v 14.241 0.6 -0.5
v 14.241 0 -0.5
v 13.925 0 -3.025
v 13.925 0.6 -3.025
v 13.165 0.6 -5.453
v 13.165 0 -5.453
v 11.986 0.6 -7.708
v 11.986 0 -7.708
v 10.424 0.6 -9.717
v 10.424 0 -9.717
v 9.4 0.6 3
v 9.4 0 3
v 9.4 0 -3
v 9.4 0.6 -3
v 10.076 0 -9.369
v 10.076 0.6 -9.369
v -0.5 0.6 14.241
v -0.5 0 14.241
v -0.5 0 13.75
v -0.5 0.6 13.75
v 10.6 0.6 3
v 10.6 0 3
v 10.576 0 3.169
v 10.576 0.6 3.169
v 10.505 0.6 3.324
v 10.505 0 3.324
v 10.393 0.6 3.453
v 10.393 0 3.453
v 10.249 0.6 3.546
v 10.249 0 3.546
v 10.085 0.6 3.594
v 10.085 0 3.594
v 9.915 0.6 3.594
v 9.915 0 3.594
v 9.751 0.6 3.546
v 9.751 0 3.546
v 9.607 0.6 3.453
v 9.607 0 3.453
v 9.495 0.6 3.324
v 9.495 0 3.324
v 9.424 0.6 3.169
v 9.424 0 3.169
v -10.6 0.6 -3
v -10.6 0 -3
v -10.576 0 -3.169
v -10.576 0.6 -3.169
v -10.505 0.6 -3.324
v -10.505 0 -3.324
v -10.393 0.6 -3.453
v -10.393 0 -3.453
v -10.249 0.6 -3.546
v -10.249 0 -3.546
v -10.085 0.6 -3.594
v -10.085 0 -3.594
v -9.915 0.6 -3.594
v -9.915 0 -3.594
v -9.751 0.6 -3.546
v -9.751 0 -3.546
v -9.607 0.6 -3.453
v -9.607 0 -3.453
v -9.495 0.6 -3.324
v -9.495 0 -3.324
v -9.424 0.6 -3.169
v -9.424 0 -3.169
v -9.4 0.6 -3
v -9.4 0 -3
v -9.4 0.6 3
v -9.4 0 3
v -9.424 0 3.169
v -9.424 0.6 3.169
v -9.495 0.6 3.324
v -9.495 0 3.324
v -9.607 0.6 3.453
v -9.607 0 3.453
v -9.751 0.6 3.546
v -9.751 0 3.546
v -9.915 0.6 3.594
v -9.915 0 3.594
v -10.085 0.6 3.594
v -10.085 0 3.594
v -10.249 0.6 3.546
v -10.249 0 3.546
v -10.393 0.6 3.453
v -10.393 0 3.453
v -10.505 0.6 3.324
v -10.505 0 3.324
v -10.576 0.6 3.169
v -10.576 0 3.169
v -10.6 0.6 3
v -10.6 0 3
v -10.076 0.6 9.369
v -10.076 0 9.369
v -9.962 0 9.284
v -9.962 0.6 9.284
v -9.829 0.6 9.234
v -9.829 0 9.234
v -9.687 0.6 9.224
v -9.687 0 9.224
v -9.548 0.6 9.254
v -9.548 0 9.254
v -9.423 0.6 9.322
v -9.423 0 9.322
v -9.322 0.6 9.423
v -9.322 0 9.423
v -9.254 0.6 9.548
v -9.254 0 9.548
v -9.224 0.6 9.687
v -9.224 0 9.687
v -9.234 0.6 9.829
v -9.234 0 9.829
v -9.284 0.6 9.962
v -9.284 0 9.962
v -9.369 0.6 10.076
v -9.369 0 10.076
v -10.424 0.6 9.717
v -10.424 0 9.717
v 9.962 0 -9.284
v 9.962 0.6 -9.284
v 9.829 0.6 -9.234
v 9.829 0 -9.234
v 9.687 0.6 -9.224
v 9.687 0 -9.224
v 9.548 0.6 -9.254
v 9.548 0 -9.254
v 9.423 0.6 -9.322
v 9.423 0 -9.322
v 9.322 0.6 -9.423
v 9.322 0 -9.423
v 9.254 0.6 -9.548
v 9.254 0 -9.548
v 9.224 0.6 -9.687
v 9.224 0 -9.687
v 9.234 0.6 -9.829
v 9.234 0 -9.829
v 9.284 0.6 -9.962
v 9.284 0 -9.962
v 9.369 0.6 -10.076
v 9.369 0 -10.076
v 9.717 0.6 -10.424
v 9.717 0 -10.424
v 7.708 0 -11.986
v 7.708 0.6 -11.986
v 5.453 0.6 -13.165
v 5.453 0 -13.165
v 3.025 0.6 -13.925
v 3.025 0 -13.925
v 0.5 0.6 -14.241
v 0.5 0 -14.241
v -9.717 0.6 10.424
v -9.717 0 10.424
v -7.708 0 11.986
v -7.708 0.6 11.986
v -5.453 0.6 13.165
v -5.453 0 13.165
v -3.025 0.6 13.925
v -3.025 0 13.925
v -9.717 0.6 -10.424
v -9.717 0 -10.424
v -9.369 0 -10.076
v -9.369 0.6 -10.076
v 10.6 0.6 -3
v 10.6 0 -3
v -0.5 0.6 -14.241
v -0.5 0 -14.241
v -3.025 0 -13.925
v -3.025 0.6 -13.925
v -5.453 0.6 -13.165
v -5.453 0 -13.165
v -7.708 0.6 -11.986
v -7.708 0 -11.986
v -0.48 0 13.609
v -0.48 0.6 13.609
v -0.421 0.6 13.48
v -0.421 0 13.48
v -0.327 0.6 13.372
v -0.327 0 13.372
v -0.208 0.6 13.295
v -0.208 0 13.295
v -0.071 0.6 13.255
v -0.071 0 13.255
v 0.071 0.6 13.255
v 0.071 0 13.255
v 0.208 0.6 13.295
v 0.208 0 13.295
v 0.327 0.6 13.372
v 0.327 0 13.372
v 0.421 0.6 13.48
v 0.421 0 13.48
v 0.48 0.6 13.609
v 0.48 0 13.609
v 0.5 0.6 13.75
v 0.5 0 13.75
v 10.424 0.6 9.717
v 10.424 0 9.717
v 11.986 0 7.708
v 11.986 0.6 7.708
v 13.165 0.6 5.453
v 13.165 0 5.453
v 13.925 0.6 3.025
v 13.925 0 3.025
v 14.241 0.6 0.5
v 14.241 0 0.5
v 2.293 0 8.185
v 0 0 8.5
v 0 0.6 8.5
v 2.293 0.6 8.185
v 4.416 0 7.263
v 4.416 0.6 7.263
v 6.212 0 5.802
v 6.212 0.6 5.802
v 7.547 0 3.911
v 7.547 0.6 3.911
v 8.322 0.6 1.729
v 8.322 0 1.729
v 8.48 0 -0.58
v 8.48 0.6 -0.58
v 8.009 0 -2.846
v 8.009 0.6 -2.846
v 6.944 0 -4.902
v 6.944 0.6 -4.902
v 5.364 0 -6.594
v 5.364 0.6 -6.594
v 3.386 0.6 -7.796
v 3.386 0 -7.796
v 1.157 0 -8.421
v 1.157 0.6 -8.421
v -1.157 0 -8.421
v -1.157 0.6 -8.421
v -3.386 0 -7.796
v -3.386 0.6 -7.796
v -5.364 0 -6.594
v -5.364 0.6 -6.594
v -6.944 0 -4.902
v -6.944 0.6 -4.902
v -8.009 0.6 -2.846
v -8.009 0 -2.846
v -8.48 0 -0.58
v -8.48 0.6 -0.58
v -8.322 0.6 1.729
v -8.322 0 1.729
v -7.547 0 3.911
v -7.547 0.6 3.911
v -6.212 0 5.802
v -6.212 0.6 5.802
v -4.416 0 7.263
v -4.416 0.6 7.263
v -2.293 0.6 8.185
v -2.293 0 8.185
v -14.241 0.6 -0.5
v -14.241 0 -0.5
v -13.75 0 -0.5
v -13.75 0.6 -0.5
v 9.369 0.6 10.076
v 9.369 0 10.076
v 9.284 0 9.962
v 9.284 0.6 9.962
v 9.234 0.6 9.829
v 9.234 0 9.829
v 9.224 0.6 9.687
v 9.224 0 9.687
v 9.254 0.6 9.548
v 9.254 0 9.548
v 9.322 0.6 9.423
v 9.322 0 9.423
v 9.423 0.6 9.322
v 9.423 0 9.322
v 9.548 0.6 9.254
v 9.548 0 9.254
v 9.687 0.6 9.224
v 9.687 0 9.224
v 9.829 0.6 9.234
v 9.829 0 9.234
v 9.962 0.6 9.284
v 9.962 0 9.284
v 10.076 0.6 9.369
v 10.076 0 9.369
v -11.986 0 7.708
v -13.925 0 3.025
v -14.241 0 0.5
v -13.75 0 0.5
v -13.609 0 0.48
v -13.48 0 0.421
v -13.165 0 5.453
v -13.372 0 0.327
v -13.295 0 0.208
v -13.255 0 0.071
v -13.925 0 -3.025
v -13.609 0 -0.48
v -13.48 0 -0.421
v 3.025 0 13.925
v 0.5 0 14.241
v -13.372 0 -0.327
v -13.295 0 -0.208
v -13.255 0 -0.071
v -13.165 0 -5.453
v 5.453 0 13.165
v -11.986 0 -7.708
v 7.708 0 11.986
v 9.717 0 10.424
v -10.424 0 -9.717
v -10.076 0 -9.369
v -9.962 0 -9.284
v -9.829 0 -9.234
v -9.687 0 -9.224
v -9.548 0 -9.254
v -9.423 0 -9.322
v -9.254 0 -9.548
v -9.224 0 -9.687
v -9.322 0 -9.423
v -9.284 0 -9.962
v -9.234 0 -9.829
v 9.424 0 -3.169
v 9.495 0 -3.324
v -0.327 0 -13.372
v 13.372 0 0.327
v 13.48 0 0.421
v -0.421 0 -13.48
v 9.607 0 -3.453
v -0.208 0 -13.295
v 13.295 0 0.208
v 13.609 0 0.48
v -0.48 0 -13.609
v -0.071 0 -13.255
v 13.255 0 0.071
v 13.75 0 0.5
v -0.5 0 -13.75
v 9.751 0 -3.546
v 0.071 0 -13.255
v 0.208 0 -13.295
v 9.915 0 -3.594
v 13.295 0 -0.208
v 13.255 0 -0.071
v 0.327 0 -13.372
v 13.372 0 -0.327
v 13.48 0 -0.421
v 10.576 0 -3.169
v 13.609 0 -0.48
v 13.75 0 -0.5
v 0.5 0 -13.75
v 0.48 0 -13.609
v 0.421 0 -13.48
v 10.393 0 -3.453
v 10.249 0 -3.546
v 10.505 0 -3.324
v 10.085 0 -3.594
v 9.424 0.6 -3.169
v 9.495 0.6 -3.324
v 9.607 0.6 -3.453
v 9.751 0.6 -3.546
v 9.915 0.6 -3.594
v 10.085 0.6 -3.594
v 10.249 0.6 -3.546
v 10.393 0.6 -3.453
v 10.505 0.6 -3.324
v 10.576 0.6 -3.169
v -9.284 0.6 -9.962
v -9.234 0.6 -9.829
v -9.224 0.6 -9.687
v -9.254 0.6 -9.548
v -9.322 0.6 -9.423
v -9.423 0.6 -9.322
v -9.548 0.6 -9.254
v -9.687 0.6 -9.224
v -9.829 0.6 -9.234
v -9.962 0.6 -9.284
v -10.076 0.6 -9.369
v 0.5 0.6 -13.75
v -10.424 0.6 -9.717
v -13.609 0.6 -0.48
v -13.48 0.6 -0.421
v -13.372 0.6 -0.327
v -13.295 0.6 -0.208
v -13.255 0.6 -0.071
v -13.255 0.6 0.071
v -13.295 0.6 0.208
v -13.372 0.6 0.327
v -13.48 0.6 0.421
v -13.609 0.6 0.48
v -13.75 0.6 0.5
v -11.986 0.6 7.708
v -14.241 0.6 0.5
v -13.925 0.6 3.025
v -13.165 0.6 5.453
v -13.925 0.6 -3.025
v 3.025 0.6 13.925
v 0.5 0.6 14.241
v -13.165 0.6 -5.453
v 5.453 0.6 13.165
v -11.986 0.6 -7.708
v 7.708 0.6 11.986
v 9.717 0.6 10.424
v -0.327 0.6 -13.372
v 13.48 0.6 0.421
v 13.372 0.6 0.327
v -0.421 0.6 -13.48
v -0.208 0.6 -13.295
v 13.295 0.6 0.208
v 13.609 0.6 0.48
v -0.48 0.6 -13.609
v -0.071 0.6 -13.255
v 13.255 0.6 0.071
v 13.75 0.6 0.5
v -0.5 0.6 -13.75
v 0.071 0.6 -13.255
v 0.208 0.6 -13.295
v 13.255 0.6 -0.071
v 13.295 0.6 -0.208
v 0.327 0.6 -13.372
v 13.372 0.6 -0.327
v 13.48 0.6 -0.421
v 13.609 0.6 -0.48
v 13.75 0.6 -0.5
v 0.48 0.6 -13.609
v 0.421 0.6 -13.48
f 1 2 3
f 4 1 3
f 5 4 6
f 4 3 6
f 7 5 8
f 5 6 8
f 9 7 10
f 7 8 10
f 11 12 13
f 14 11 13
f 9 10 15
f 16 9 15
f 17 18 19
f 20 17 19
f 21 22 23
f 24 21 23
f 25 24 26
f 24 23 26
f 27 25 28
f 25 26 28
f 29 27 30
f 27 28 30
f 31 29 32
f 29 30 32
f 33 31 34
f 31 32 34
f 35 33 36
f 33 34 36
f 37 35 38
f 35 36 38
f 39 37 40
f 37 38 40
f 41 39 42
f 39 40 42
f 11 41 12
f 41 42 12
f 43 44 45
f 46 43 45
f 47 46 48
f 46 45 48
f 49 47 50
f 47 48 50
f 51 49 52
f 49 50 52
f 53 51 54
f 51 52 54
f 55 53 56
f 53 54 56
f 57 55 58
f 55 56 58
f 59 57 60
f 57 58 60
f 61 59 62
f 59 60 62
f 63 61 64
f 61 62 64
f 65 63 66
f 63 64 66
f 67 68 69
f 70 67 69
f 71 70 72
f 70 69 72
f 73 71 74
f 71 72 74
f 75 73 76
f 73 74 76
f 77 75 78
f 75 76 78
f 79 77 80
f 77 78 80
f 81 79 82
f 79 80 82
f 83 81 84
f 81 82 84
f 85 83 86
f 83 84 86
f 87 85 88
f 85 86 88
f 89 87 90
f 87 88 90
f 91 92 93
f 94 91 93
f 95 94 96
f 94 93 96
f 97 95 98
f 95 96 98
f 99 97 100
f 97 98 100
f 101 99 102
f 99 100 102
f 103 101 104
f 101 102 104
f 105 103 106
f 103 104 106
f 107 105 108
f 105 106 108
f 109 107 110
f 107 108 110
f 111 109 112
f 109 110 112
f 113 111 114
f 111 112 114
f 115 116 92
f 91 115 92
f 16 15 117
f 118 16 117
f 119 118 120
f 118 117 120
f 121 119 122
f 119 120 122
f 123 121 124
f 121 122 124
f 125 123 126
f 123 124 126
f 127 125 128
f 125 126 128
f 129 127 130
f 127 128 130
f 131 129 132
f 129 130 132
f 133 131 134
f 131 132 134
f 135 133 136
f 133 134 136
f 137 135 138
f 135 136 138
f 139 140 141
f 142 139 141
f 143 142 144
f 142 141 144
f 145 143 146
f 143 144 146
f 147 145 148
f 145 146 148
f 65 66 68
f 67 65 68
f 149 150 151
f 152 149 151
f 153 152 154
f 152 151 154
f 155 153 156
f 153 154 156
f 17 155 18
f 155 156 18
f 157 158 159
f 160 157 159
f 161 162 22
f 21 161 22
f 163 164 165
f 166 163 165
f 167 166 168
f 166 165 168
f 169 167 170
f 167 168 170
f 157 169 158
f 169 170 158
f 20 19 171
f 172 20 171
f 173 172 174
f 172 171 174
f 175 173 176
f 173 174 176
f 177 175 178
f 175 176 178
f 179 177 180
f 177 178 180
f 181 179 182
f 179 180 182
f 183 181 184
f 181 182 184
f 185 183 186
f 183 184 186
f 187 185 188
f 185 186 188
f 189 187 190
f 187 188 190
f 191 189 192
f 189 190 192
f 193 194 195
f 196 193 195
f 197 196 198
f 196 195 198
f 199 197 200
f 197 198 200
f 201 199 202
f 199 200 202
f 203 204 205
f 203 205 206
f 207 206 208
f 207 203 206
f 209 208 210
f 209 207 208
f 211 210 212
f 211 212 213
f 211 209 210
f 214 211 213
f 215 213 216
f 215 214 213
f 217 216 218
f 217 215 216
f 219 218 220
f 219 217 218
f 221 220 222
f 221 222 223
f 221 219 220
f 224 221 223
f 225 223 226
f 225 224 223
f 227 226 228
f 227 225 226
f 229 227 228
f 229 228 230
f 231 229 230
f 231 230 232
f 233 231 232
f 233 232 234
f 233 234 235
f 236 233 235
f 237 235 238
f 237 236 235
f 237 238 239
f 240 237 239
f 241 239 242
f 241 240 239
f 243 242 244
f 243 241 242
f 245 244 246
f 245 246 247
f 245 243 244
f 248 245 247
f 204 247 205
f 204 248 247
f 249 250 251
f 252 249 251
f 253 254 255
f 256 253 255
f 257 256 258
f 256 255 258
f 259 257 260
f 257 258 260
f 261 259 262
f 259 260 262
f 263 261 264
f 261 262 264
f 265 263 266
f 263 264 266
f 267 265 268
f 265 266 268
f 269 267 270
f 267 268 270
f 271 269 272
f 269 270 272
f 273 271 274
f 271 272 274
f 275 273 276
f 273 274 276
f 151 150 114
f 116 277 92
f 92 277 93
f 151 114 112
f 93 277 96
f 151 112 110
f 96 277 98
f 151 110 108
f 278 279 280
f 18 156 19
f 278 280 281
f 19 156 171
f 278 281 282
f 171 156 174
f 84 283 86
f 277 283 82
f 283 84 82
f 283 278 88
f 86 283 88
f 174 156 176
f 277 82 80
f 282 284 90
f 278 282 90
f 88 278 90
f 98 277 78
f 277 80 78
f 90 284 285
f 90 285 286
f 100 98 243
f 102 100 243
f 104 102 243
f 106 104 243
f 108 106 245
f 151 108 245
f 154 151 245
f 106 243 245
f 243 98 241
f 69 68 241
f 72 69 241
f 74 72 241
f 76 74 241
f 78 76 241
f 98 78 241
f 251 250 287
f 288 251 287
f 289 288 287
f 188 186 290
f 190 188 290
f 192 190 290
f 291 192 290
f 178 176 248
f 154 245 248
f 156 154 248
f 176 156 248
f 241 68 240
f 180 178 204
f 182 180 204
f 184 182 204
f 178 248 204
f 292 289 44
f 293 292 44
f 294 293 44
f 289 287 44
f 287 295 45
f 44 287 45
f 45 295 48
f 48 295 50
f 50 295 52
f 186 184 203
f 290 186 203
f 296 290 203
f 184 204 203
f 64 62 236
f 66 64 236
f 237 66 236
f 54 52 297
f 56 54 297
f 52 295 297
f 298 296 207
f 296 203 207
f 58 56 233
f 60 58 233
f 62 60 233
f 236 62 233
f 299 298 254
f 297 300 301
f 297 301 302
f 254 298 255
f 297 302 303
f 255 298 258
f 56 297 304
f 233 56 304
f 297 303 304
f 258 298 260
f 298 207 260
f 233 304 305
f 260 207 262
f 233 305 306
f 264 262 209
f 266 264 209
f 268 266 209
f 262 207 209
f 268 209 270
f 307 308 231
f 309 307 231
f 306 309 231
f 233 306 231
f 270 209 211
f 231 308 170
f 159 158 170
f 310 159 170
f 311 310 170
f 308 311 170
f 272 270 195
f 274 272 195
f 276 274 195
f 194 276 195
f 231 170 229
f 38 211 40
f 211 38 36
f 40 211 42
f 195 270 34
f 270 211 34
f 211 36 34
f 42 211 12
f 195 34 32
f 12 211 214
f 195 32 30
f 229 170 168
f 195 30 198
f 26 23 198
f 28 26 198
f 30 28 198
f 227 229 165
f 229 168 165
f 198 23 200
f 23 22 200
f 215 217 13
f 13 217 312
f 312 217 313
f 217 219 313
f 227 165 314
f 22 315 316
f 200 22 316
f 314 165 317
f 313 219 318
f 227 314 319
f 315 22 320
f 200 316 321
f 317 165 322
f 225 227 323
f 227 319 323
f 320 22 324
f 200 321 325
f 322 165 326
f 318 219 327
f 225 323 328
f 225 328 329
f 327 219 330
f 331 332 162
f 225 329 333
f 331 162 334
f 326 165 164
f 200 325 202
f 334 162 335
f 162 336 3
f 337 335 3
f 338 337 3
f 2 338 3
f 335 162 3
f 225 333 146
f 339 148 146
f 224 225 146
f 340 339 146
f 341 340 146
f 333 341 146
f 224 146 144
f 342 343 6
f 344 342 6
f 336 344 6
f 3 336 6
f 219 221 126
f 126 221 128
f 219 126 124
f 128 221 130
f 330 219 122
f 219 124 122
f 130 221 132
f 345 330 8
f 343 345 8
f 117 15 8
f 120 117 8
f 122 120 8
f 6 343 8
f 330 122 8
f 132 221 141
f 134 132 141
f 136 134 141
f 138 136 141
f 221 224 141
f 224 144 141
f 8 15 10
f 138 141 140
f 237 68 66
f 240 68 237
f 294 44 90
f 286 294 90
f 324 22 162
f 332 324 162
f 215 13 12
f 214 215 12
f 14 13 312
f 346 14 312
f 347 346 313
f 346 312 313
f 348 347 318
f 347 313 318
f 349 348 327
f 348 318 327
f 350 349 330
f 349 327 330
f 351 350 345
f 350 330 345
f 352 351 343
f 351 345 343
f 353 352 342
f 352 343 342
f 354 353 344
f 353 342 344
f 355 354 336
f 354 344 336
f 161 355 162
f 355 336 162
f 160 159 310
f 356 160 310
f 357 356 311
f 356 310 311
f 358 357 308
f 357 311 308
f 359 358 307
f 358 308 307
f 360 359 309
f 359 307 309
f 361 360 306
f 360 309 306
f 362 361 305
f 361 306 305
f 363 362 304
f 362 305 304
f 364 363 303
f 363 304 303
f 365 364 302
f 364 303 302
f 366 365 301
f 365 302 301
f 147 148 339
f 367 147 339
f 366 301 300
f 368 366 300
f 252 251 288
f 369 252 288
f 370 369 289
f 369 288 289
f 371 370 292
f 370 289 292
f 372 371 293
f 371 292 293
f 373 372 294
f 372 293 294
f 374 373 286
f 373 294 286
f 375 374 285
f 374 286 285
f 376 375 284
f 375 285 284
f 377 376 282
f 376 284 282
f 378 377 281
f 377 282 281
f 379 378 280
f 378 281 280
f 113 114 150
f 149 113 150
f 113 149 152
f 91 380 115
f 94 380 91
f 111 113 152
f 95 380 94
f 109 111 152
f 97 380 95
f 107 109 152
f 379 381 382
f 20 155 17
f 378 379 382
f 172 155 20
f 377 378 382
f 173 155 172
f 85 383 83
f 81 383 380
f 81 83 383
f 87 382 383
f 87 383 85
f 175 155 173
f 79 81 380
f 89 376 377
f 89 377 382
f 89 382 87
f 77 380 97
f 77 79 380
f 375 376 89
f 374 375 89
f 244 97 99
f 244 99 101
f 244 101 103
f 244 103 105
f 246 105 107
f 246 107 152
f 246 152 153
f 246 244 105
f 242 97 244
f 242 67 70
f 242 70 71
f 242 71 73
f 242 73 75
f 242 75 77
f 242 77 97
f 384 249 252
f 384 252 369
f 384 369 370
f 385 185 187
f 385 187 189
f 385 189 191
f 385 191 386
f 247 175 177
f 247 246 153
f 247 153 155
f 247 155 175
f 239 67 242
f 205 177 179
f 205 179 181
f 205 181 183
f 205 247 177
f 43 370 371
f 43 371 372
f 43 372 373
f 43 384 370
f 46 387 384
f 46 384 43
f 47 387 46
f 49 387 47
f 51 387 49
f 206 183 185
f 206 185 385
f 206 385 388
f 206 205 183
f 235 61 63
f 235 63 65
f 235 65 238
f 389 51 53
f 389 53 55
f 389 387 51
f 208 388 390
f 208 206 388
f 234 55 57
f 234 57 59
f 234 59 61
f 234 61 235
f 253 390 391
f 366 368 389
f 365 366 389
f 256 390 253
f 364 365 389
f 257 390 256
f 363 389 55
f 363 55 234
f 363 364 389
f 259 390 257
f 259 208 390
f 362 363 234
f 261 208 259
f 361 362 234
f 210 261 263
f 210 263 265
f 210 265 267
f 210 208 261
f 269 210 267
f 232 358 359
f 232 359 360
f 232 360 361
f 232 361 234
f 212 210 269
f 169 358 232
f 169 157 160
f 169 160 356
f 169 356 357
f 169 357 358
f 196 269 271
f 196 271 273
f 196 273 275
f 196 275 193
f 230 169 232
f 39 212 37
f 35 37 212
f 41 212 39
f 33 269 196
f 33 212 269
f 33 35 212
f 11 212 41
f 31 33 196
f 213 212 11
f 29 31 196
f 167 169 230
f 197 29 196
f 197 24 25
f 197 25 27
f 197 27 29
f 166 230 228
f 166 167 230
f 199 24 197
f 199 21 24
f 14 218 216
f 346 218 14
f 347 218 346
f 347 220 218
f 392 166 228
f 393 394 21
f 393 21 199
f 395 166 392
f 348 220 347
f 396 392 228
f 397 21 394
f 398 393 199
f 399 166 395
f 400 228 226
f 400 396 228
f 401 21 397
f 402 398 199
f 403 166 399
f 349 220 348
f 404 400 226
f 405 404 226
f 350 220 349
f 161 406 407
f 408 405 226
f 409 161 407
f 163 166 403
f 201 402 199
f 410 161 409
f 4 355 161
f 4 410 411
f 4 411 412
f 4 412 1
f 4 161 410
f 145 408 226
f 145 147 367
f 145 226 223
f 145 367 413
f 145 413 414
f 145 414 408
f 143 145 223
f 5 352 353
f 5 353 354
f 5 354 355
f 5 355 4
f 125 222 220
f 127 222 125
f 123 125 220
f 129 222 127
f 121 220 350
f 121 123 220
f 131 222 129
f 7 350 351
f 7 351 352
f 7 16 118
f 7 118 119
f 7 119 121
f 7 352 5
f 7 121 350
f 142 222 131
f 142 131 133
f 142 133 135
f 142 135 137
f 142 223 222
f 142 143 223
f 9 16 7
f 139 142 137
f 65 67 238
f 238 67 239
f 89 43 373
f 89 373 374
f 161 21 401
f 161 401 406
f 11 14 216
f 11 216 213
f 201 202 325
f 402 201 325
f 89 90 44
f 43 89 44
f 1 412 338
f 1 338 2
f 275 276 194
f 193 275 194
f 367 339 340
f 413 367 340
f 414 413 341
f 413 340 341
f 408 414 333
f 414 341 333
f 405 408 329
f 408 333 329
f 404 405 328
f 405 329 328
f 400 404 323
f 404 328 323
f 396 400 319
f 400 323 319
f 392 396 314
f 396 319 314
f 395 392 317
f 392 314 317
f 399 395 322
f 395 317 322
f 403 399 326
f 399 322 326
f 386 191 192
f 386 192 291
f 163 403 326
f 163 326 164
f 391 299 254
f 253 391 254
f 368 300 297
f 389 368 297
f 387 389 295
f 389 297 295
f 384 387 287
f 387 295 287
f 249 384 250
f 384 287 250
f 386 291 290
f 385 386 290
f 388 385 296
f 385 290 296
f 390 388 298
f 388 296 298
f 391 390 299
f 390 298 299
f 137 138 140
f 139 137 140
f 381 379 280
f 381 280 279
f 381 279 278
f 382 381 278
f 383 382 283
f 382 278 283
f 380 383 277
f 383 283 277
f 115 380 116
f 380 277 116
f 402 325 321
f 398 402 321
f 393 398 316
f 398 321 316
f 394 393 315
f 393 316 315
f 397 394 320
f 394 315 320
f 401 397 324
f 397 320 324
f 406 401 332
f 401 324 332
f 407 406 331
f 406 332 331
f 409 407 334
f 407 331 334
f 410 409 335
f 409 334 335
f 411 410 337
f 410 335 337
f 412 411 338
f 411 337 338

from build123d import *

# Parameters (mm, degrees)
SKETCH1_R           = 8.5
BOSS_EXTRUDE1_DEPTH = 0.6


with BuildPart() as part:
    # Sketch1 → Boss-Extrude1 (new body)
    with BuildSketch(Plane(origin=(0, 0, 0), x_dir=(1, 0, 0), z_dir=(0, 1, 0))):
        with BuildLine():
            Line((-0.5, -14.241225369), (-0.5, -13.75))
            ThreePointArc((-0.5, -13.75), (0, -13.25), (0.5, -13.75))
            Line((0.5, -13.75), (0.5, -14.241225369))
            ThreePointArc((0.5, -14.241225369), (5.453238911, -13.165283338), (9.71651364, -10.423620421))
            Line((9.71651364, -10.423620421), (9.369164851, -10.076271632))
            ThreePointArc((9.369164851, -10.076271632), (9.369164851, -9.369164851), (10.076271632, -9.369164851))
            Line((10.076271632, -9.369164851), (10.423620421, -9.71651364))
            ThreePointArc((10.423620421, -9.71651364), (13.165283338, -5.453238911), (14.241225369, -0.5))
            Line((14.241225369, -0.5), (13.75, -0.5))
            ThreePointArc((13.75, -0.5), (13.25, 0), (13.75, 0.5))
            Line((13.75, 0.5), (14.241225369, 0.5))
            ThreePointArc((14.241225369, 0.5), (13.165283338, 5.453238911), (10.423620421, 9.71651364))
            Line((10.423620421, 9.71651364), (10.076271632, 9.369164851))
            ThreePointArc((10.076271632, 9.369164851), (9.369164851, 9.369164851), (9.369164851, 10.076271632))
            Line((9.369164851, 10.076271632), (9.71651364, 10.423620421))
            ThreePointArc((9.71651364, 10.423620421), (5.453238911, 13.165283338), (0.5, 14.241225369))
            Line((0.5, 14.241225369), (0.5, 13.75))
            ThreePointArc((0.5, 13.75), (0, 13.25), (-0.5, 13.75))
            Line((-0.5, 13.75), (-0.5, 14.241225369))
            ThreePointArc((-0.5, 14.241225369), (-5.453238911, 13.165283338), (-9.71651364, 10.423620421))
            Line((-9.71651364, 10.423620421), (-9.369164851, 10.076271632))
            ThreePointArc((-9.369164851, 10.076271632), (-9.369164851, 9.369164851), (-10.076271632, 9.369164851))
            Line((-10.076271632, 9.369164851), (-10.423620421, 9.71651364))
            ThreePointArc((-10.423620421, 9.71651364), (-13.165283338, 5.453238911), (-14.241225369, 0.5))
            Line((-14.241225369, 0.5), (-13.75, 0.5))
            ThreePointArc((-13.75, 0.5), (-13.25, 0), (-13.75, -0.5))
            Line((-13.75, -0.5), (-14.241225369, -0.5))
            ThreePointArc((-14.241225369, -0.5), (-13.165283338, -5.453238911), (-10.423620421, -9.71651364))
            Line((-10.423620421, -9.71651364), (-10.076271632, -9.369164851))
            ThreePointArc((-10.076271632, -9.369164851), (-9.369164851, -9.369164851), (-9.369164851, -10.076271632))
            Line((-9.369164851, -10.076271632), (-9.71651364, -10.423620421))
            ThreePointArc((-9.71651364, -10.423620421), (-5.453238911, -13.165283338), (-0.5, -14.241225369))
        make_face()
        with BuildLine():
            Line((-9.4, 3), (-9.4, -3))
            ThreePointArc((-9.4, -3), (-10, -3.6), (-10.6, -3))
            Line((-10.6, -3), (-10.6, 3))
            ThreePointArc((-10.6, 3), (-10, 3.6), (-9.4, 3))
        make_face(mode=Mode.SUBTRACT)
        with Locations(Location((0, 0, 0), (0, 0, 270))):
            Circle(SKETCH1_R, mode=Mode.SUBTRACT)
        with BuildLine():
            ThreePointArc((10.6, -3), (10, -3.6), (9.4, -3))
            Line((9.4, -3), (9.4, 3))
            ThreePointArc((9.4, 3), (10, 3.6), (10.6, 3))
            Line((10.6, 3), (10.6, -3))
        make_face(mode=Mode.SUBTRACT)
    extrude(amount=BOSS_EXTRUDE1_DEPTH)


solid = part.part
